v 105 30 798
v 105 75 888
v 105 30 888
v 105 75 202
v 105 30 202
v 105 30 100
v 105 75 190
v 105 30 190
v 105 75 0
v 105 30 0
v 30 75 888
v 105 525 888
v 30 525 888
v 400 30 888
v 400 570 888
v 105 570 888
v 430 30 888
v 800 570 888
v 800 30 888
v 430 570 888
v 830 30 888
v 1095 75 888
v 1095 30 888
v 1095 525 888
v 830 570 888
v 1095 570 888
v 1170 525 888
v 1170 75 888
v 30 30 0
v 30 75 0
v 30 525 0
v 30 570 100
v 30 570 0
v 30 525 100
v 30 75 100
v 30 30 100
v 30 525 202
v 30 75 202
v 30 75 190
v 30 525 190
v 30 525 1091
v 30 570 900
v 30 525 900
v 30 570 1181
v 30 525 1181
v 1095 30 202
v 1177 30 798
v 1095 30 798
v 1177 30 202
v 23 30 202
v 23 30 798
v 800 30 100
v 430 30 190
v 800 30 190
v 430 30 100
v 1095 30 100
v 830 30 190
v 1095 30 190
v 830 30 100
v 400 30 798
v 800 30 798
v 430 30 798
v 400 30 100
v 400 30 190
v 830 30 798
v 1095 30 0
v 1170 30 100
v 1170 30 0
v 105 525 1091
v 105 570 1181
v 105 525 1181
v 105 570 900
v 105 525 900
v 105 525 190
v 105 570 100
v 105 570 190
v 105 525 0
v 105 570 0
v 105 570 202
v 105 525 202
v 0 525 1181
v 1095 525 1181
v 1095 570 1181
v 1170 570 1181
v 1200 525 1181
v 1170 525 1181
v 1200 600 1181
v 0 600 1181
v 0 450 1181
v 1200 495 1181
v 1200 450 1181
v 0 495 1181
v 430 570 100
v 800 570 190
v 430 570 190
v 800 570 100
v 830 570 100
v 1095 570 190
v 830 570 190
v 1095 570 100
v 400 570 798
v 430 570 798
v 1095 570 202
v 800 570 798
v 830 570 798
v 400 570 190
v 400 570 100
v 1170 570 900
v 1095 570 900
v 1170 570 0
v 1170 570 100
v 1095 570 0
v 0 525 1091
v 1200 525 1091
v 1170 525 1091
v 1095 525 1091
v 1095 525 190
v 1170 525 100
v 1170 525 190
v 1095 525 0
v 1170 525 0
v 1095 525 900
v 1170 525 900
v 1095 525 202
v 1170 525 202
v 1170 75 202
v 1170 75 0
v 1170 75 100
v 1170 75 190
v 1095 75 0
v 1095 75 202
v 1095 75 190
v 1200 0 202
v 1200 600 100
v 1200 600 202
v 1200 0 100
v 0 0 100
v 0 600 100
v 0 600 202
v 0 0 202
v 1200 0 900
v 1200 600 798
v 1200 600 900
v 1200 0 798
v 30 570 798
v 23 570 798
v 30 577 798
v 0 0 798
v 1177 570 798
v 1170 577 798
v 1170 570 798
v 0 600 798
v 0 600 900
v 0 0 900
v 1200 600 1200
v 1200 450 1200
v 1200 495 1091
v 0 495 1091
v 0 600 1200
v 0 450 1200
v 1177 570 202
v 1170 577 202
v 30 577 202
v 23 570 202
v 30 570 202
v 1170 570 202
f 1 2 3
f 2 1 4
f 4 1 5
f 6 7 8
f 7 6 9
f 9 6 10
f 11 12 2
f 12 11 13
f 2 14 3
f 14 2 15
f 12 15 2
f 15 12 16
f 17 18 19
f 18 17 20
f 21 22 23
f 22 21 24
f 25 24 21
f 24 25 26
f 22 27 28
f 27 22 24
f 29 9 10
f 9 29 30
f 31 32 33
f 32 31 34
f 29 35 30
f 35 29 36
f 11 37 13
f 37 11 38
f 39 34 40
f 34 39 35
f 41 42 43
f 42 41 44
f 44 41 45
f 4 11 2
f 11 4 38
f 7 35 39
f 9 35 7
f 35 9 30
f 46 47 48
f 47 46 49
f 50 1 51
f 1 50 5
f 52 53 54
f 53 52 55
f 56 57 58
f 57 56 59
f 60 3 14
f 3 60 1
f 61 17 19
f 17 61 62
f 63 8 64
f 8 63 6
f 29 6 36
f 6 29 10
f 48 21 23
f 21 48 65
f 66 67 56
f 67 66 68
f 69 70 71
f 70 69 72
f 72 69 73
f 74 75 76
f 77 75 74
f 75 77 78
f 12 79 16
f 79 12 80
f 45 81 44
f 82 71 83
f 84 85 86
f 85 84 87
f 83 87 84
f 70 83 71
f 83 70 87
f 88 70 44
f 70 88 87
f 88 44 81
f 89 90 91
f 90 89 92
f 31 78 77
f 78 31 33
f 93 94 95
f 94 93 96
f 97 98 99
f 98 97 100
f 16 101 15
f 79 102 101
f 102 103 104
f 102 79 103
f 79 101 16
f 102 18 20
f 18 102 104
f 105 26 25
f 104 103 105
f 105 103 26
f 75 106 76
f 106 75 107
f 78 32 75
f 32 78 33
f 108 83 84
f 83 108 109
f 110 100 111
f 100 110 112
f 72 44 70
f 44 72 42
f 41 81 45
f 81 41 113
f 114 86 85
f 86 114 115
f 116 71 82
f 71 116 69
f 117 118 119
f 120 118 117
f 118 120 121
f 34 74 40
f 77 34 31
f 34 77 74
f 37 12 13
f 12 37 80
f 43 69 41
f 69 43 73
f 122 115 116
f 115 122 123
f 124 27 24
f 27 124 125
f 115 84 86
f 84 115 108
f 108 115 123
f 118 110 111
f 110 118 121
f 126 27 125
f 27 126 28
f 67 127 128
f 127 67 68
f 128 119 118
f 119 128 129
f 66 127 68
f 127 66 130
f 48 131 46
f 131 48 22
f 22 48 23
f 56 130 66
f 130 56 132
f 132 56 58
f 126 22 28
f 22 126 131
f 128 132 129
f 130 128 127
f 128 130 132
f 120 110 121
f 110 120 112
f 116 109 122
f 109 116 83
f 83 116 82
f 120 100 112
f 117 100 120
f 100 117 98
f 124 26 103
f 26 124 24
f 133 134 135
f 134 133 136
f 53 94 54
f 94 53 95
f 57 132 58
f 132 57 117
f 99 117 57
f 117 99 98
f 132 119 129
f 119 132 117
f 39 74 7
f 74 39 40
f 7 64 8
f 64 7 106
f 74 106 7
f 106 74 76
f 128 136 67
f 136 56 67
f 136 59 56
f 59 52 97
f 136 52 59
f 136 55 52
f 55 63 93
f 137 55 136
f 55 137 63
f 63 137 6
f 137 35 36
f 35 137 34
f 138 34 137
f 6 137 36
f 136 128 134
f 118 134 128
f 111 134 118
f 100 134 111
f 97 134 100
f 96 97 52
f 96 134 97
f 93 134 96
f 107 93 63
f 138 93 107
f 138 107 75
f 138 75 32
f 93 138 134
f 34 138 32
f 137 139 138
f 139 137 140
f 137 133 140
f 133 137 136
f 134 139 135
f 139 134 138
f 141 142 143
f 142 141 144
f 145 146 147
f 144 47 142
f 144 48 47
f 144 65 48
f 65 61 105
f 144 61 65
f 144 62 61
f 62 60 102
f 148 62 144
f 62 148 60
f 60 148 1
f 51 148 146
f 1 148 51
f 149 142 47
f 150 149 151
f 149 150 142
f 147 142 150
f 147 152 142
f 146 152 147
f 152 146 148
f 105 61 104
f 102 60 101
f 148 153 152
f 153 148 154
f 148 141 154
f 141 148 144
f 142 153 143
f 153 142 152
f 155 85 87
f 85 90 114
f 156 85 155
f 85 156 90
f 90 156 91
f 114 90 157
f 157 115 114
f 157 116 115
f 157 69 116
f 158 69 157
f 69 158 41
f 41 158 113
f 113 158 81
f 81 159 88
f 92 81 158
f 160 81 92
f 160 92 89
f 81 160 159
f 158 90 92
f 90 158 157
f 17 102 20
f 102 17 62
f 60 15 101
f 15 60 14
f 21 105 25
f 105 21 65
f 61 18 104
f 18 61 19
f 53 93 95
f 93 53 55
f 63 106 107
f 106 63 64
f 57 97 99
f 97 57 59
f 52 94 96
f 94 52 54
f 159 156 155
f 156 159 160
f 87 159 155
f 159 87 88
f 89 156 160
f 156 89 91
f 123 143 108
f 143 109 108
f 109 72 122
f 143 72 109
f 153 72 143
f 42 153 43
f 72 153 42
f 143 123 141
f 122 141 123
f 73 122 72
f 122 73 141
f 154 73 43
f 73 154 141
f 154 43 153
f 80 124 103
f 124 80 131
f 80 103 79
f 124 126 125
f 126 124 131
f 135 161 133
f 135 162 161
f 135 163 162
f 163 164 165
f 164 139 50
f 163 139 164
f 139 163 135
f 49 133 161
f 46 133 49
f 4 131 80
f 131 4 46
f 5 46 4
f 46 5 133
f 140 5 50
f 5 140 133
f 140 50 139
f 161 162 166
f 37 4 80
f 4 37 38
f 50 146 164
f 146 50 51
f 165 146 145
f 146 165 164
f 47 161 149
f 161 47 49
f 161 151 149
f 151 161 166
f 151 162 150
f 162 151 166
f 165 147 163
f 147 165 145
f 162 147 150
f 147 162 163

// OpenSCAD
mdf = "tan";
pine = "lemonchiffon";

surface_z = 12;
shelf_z = 19;
clearance_z = 100;
work_z = 900;
side_x = 7;

bbox_x = 1200;
bbox_y = 600;
bbox_z = 1200;

function bbox000(v) = [             0,             0,             0 ];
function bbox001(v) = [             0,             0, bbox_z - v[2] ];
function bbox010(v) = [             0, bbox_y - v[1],             0 ];
function bbox011(v) = [             0, bbox_y - v[1], bbox_z - v[2] ];
function bbox100(v) = [ bbox_x - v[0],             0,             0 ];
function bbox101(v) = [ bbox_x - v[0],             0, bbox_z - v[2] ];
function bbox110(v) = [ bbox_x - v[0], bbox_y - v[1],             0 ];
function bbox111(v) = [ bbox_x - v[0], bbox_y - v[1], bbox_z - v[2] ];

module component(v, name)
{
  cube(v);
  echo(name, v);
}

function leg()   = [ 75, 45, work_z - surface_z ];
function bleg()  = [ 75, 45, bbox_z - shelf_z ];
function xbeam() = [ bbox_x, 30, 90 ];
function ybeam() = [ 30, bbox_y - 60, 90 ];
function top()   = [ bbox_x, bbox_y, surface_z ];
function side()  = [ side_x, bbox_y - 60, work_z - 180 - clearance_z - surface_z - surface_z ];
function back()  = [ bbox_x - 60, side_x, work_z - 180 - clearance_z - surface_z - surface_z ];
function shelf() = [ bbox_x, 150, shelf_z ];

function fbox000(v) = bbox000(v) + [ 0, 0, 0 ];
function fbox001(v) = bbox001(v) + [ 0, 0, -(bbox_z-work_z)-surface_z ];
function fbox010(v) = bbox010(v) + [ 0, 0, 0 ];
function fbox011(v) = bbox011(v) + [ 0, 0, -(bbox_z-work_z)-surface_z ];
function fbox100(v) = bbox100(v) + [ 0, 0, 0 ];
function fbox101(v) = bbox101(v) + [ 0, 0, -(bbox_z-work_z)-surface_z ];
function fbox110(v) = bbox110(v) + [ 0, 0, 0 ];
function fbox111(v) = bbox111(v) + [ 0, 0, -(bbox_z-work_z)-surface_z ];

color(pine)
{
  translate(fbox000(leg()))   
    translate([ 30, 30, 0 ])
      component(leg(), "leg (front left)");

  translate(fbox010(bleg()))  
    translate([ 30, -30, 0 ])
      component(bleg(), "leg (back left)");

  translate(fbox100(leg()))   
    translate([ -30, 30, 0 ])
      component(leg(), "leg (front right)");

  translate(fbox110(bleg()))  
    translate([ -30, -30, 0 ])
      component(bleg(), "leg (back right)");

  translate(fbox000(xbeam())) 
    translate([ 0, 0, clearance_z ])
      component(xbeam(), "xbeam (front lower)");

  translate(fbox010(xbeam())) 
    translate([ 0, 0, clearance_z ])
      component(xbeam(), "xbeam (back lower)");

  translate(fbox001(xbeam())) 
    translate([ 0, 0, 0 ])
      component(xbeam(), "xbeam (front upper)");

  translate(fbox011(xbeam())) 
    translate([ 0, 0, 0 ])
      component(xbeam(), "xbeam (back upper)");

  translate(bbox011(xbeam())) 
    translate([ 0, -75, -shelf_z ])
      component(xbeam(), "xbeam shelf");

  translate(fbox000(ybeam())) 
    translate([ 0, 30, clearance_z ])
      component(ybeam(), "ybeam");

  translate(fbox100(ybeam())) 
    translate([ 0, 30, clearance_z ])
      component(ybeam(), "ybeam");

  translate(fbox001(ybeam())) 
    translate([ 0, 30, 0 ])
      component(ybeam(), "ybeam");

  translate(fbox101(ybeam())) 
    translate([ 0, 30, 0 ])
      component(ybeam(), "ybeam");

  translate(fbox001(ybeam())) 
    translate([ bbox_x/3, 30, 0 ])
      component(ybeam(), "ybeam");

  translate(fbox001(ybeam())) 
    translate([ bbox_x - bbox_x/3, 30, 0 ])
      component(ybeam(), "ybeam");

  translate(fbox000(ybeam())) 
    translate([ bbox_x/3, 30, clearance_z ])
      component(ybeam(), "ybeam");

  translate(fbox000(ybeam())) 
    translate([ bbox_x - bbox_x/3, 30, clearance_z ])
      component(ybeam(), "ybeam");

  translate(bbox011(shelf())) 
    component(shelf(), "shelf");
}

color(mdf)
{
  translate(bbox001(top()))
    translate([ 0, 0, -300 ] )
      component(top(), "surface (upper)");

  translate(bbox000(top()))
    translate([ 0, 0, clearance_z + 90 ])
      component(top(), "surface (lower)");

  translate(bbox000(side()))
    translate([ 30 - side_x, 30, clearance_z + 90 + surface_z ])
      component(side(), "side (left)");

  translate(bbox100(side()))
    translate([ - 30 + side_x, 30, clearance_z + 90 + surface_z ])
      component(side(), "side (left)");

  translate(bbox010(back()))
    translate([ 30, -30 + side_x, clearance_z + 90 + surface_z ])
      component(back(), "back");
}

//%cube([bbox_x, bbox_y, bbox_z]);
